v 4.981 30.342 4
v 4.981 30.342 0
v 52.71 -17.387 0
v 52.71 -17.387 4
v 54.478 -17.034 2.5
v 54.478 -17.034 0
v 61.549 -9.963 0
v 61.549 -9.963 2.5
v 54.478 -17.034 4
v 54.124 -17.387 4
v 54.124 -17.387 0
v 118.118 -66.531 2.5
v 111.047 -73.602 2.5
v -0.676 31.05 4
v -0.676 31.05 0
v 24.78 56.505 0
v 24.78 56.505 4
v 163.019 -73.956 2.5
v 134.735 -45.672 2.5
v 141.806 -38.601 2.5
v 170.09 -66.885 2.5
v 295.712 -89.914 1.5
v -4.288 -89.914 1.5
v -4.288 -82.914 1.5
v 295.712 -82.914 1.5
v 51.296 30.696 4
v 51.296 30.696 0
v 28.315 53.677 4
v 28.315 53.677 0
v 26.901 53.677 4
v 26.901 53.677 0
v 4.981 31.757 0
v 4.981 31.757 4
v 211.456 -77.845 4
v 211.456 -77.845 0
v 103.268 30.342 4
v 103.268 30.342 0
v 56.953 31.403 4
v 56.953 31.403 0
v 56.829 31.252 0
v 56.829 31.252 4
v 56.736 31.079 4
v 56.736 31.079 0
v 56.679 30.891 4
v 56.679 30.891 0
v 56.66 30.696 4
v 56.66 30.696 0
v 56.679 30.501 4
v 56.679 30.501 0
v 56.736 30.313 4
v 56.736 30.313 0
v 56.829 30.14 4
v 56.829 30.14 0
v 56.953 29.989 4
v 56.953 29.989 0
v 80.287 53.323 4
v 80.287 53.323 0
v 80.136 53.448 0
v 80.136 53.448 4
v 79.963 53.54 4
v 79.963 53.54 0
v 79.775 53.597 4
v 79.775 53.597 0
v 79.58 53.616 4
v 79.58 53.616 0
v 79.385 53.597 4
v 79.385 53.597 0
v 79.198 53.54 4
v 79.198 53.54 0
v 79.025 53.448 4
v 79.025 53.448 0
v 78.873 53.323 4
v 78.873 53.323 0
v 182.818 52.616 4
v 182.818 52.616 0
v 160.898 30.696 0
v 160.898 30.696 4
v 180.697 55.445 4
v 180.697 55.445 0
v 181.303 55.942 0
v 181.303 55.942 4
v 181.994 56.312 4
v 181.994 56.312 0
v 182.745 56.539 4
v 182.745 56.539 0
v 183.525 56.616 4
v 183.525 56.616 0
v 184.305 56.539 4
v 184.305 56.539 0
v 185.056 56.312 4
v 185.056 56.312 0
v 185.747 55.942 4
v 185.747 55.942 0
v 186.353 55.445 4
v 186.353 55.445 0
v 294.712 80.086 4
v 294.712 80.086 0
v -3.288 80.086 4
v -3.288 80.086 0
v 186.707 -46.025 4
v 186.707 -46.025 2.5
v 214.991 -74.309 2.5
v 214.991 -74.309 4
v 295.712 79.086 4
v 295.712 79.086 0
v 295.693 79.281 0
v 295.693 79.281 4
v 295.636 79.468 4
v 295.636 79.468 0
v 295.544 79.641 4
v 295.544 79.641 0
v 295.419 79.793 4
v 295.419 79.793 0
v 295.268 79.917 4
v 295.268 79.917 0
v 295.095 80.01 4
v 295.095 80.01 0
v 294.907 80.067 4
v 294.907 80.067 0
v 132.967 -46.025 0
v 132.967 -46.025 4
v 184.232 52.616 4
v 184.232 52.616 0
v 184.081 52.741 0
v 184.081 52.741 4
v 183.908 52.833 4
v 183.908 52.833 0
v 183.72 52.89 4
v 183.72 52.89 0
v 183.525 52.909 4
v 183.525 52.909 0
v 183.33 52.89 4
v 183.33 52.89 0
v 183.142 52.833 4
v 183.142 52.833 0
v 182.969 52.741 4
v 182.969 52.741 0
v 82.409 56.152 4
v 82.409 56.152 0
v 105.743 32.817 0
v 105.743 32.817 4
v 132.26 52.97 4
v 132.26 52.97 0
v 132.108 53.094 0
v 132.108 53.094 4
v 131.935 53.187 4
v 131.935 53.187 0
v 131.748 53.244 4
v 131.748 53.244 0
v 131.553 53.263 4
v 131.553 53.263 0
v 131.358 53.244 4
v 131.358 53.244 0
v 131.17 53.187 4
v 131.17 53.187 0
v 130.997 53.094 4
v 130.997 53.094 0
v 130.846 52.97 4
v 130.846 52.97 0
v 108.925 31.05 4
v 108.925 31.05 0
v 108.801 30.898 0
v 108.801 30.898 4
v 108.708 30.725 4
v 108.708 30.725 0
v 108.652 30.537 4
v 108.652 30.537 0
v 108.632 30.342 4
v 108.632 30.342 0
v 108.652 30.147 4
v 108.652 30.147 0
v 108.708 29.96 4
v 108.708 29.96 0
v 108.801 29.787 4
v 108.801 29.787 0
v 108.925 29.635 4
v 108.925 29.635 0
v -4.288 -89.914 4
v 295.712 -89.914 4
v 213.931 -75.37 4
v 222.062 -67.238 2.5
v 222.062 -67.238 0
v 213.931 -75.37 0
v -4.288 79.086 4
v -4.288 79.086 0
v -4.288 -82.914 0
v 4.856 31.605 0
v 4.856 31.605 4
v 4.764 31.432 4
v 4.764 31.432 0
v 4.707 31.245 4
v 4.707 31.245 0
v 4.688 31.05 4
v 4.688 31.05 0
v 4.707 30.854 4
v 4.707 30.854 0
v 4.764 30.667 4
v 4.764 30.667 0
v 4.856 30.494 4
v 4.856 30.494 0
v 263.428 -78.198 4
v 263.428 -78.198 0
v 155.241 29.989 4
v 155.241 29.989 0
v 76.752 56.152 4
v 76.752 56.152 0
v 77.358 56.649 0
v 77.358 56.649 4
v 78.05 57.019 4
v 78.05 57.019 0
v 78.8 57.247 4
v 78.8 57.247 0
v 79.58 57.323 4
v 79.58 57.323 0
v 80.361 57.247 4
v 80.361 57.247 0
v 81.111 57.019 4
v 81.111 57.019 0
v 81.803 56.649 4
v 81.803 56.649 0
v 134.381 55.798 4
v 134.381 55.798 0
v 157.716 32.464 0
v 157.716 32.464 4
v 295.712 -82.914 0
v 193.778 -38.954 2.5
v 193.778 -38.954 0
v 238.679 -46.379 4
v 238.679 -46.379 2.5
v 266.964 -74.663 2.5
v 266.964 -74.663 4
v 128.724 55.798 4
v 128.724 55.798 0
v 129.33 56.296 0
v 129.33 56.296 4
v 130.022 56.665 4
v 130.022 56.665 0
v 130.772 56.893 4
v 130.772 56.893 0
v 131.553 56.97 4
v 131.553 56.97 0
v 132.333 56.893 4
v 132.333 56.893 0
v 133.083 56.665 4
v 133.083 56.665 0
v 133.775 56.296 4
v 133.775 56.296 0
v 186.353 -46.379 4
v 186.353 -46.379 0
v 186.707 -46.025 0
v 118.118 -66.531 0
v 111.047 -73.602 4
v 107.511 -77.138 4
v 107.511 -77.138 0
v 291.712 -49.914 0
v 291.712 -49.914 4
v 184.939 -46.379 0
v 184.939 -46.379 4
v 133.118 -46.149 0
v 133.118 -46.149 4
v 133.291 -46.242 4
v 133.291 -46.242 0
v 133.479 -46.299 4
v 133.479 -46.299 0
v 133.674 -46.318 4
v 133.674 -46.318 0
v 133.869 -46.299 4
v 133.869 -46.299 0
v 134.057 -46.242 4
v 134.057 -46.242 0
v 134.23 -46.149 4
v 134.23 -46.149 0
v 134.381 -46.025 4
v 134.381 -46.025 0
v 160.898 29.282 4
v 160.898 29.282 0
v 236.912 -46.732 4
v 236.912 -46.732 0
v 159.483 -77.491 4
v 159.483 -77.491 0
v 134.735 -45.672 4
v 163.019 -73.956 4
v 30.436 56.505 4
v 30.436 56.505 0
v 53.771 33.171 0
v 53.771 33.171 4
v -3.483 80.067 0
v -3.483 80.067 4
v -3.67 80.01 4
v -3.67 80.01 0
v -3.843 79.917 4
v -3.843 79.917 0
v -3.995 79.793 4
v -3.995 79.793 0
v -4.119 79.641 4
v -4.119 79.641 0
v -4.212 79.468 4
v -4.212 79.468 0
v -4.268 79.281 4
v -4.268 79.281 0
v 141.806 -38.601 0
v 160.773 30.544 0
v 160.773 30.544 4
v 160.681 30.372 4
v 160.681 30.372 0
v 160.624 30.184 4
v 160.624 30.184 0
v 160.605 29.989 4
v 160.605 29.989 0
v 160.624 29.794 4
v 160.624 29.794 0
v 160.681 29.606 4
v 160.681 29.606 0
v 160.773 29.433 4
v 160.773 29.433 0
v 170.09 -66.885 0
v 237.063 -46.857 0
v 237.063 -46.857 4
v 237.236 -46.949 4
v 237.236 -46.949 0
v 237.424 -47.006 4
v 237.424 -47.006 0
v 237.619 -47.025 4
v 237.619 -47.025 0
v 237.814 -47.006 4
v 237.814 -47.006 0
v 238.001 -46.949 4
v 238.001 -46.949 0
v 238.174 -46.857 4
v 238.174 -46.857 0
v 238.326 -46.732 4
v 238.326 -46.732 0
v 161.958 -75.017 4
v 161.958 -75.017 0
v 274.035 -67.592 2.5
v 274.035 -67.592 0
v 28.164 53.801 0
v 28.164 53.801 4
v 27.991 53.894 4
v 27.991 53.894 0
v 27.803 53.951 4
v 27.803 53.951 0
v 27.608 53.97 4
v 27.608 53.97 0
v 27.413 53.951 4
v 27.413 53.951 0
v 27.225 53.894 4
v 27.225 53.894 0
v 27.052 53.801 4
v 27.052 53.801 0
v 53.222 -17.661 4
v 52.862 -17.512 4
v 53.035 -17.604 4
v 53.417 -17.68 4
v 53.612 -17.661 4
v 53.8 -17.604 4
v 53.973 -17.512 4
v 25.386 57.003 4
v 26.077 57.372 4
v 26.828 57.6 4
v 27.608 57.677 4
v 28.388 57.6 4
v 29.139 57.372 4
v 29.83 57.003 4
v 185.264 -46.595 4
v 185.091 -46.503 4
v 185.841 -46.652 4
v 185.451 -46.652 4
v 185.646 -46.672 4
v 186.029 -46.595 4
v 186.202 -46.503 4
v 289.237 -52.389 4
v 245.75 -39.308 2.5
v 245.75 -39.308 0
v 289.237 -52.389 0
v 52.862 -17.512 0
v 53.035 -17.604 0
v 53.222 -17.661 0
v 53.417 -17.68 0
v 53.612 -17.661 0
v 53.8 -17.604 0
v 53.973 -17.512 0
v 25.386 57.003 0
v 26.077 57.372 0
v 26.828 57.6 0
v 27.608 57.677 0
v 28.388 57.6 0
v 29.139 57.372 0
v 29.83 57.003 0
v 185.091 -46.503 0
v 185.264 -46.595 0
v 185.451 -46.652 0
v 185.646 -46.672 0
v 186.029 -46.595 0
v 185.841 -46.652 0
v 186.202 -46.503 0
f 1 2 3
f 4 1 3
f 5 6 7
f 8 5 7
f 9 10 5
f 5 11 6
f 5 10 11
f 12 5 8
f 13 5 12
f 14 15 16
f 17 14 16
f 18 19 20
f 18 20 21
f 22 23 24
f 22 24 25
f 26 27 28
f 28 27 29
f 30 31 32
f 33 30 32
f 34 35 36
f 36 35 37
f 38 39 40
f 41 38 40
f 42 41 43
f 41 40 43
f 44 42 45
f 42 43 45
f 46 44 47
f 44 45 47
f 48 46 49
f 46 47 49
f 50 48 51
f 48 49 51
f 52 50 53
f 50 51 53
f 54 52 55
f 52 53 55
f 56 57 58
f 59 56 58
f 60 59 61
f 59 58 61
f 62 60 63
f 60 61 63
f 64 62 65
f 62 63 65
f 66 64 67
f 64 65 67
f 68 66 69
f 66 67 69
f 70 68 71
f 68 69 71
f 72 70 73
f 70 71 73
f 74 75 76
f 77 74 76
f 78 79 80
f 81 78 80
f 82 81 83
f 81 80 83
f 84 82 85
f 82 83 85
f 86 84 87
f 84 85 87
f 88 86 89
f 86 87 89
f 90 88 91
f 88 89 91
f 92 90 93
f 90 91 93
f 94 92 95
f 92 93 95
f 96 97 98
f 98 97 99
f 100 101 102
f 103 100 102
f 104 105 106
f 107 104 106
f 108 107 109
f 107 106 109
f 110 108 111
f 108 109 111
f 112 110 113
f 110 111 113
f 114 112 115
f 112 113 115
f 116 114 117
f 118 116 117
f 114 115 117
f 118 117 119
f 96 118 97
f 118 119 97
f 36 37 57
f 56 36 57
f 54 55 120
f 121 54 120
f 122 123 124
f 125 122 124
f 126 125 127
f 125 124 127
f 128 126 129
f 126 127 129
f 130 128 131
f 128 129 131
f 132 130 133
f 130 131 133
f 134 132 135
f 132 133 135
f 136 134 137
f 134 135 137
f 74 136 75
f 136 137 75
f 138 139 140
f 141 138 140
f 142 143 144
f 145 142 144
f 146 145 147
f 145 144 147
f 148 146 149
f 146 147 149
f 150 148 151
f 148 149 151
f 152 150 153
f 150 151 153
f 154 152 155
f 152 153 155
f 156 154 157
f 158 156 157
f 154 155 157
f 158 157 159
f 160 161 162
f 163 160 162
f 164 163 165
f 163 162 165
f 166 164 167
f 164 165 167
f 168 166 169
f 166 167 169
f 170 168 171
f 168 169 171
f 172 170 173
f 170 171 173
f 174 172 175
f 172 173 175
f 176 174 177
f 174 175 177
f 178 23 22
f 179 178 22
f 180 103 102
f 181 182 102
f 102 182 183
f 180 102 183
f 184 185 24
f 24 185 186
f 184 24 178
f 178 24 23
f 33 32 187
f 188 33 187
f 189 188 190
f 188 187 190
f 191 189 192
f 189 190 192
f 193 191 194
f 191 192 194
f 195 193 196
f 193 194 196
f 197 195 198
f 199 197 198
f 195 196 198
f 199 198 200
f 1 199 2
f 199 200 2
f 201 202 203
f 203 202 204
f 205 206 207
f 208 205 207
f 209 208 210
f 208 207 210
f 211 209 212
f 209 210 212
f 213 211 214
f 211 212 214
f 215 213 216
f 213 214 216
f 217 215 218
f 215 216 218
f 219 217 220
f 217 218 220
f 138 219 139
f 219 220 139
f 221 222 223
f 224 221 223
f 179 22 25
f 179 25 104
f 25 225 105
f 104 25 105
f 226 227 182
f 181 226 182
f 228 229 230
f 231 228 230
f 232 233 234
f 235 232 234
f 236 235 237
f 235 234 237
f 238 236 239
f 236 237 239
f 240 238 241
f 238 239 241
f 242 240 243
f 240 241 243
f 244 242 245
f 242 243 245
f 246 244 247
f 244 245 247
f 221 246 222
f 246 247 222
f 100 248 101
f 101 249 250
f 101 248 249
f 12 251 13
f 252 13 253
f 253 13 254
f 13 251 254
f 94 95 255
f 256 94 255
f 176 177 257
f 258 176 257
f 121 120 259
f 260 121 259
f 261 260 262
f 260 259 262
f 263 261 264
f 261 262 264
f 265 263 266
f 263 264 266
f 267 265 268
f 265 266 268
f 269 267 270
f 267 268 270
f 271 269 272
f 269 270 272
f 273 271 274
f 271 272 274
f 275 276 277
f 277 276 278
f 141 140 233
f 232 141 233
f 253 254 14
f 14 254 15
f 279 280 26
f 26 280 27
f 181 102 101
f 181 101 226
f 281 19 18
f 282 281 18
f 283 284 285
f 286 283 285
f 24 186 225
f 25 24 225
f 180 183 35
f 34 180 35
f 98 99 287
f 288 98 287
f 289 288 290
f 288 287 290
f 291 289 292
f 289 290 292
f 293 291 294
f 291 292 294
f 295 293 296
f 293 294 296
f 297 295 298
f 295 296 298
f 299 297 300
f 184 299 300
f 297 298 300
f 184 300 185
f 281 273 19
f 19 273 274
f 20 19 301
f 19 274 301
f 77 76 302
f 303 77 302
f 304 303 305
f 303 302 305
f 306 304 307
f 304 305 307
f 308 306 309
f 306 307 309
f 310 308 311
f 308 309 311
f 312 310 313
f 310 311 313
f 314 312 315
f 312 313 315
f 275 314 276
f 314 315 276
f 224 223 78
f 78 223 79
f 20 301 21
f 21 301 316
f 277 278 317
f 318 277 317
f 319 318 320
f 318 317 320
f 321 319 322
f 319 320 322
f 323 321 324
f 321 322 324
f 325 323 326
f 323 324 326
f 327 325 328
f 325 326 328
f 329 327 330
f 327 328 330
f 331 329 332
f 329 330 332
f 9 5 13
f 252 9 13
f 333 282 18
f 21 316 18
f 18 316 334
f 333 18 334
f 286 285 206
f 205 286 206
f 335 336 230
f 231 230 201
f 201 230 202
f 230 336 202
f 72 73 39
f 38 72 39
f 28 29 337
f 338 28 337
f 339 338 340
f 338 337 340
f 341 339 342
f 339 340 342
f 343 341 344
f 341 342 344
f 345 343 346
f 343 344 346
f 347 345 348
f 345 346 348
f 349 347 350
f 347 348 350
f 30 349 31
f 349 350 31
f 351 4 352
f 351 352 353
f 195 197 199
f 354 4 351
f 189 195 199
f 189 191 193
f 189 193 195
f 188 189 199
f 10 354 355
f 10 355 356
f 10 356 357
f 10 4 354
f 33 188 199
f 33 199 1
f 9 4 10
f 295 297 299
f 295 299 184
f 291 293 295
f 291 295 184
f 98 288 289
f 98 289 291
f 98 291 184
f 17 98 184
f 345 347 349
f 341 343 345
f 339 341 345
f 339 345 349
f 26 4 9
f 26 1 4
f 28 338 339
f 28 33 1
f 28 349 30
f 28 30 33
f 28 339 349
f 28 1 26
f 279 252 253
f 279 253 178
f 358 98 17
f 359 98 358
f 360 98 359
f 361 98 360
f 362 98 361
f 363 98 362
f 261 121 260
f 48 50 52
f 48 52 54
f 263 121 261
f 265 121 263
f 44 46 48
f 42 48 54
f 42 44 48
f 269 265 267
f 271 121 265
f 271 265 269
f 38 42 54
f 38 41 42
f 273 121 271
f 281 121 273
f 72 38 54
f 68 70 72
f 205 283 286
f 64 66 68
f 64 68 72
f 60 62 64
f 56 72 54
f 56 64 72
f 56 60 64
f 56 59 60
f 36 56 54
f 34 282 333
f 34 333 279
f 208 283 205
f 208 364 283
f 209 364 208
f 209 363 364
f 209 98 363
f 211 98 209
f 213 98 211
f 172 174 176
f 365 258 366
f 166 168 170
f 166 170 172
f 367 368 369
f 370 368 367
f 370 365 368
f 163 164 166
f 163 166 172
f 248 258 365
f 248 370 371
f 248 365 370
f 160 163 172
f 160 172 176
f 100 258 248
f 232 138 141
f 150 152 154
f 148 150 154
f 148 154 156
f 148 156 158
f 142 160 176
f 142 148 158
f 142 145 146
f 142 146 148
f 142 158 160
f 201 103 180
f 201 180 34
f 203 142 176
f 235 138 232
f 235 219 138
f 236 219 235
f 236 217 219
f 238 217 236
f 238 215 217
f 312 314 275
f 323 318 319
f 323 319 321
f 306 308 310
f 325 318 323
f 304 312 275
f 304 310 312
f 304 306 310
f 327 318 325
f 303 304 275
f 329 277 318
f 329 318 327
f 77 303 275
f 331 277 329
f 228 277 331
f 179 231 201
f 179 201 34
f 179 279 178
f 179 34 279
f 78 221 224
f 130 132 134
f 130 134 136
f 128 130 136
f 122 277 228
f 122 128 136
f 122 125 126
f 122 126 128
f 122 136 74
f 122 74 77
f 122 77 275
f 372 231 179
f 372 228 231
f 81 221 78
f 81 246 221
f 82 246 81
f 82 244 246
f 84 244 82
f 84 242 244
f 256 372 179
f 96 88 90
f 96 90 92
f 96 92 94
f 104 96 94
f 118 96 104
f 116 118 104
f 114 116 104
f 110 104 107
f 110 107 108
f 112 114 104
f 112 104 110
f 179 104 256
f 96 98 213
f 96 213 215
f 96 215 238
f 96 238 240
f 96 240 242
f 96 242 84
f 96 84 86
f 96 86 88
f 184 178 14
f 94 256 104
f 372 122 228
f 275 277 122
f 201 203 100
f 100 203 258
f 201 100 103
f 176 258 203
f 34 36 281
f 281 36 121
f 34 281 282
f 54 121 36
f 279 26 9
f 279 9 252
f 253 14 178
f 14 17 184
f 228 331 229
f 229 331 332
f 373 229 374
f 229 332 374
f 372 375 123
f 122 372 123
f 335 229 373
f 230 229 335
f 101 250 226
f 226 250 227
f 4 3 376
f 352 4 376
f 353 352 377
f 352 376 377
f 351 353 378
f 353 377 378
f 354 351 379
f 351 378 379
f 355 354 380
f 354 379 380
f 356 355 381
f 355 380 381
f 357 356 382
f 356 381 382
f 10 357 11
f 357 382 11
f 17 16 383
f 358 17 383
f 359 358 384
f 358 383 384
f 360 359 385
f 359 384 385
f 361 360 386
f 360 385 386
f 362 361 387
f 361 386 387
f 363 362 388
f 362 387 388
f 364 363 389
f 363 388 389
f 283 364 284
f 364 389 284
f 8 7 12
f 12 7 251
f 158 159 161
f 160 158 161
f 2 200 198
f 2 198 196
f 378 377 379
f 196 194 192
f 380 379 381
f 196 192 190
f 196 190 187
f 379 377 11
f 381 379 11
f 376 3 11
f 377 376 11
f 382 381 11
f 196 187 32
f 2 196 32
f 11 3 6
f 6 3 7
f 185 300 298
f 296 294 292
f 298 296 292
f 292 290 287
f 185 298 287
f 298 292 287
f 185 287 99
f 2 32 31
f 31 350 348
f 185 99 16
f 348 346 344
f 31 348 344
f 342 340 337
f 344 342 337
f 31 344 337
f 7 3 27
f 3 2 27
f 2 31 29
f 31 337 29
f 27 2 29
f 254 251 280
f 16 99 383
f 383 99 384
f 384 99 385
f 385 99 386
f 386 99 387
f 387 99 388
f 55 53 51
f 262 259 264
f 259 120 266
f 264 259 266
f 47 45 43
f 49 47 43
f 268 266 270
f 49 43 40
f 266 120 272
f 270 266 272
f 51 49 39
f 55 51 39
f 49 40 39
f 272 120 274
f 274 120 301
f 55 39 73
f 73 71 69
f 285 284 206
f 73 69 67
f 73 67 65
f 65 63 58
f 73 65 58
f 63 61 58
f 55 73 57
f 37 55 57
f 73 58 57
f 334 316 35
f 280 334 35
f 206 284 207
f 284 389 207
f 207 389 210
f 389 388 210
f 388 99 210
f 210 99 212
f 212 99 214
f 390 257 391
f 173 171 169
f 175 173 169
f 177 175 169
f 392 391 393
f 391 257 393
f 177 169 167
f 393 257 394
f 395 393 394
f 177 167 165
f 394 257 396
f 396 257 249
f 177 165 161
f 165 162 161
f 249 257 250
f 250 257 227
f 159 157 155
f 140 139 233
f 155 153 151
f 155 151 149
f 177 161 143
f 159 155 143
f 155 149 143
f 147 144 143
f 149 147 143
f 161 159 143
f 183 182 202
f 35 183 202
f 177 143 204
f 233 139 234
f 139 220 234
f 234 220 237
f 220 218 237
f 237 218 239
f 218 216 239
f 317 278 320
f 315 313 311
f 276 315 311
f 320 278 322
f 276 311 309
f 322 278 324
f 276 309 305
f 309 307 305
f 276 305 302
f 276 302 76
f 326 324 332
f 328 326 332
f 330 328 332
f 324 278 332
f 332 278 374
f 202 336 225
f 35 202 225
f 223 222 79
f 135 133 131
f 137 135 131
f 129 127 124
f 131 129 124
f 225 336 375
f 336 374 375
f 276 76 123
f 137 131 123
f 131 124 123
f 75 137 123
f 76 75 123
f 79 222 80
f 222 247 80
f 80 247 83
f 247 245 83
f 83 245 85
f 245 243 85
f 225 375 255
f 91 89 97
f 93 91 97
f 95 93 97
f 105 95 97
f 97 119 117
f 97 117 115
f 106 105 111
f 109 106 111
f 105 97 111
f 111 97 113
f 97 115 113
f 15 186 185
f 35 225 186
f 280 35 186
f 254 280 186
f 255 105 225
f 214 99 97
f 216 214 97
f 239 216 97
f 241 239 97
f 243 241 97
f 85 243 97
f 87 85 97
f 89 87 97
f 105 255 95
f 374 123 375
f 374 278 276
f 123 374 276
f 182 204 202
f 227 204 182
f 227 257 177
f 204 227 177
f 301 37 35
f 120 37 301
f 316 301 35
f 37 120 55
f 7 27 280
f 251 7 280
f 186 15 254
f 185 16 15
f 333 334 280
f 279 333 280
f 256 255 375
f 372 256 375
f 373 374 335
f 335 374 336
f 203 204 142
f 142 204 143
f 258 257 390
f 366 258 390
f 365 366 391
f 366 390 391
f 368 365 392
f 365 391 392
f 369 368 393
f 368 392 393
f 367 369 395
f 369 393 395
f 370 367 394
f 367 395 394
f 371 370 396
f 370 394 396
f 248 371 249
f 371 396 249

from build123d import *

# Parameters (mm, degrees)
F1_DEPTH = 4
F2_W     = 300
F2_H     = 7
F3_DEPTH = 1.5
F4_DEPTH = 2.5


with BuildPart() as f1:
    # F0 (on Top) → F1 (new body)
    with BuildSketch(Plane.XY):
        with BuildLine():
            Line((-4.287656, -89.914214), (295.712344, -89.914214))
            Line((295.712344, -89.914214), (295.712344, 79.085786))
            ThreePointArc((295.712344, 79.085786), (295.41945, 79.792893), (294.712344, 80.085786))
            Line((294.712344, 80.085786), (-3.287656, 80.085786))
            ThreePointArc((-3.287656, 80.085786), (-3.994763, 79.792893), (-4.287656, 79.085786))
            Line((-4.287656, 79.085786), (-4.287656, -89.914214))
        make_face()
        with BuildLine():
            ThreePointArc((180.696579, 55.444697), (183.525006, 56.61627), (186.353433, 55.444697))
            Line((186.353433, 55.444697), (291.712344, -49.914214))
            Line((291.712344, -49.914214), (289.23747, -52.389087))
            Line((289.23747, -52.389087), (184.232113, 52.61627))
            ThreePointArc((184.232113, 52.61627), (183.525006, 52.909163), (182.817899, 52.61627))
            Line((182.817899, 52.61627), (160.897589, 30.695959))
            ThreePointArc((160.897589, 30.695959), (160.604696, 29.988853), (160.897589, 29.281746))
            Line((160.897589, 29.281746), (236.911568, -46.732233))
            ThreePointArc((236.911568, -46.732233), (237.618675, -47.025126), (238.325782, -46.732233))
            Line((238.325782, -46.732233), (238.679335, -46.37868))
            Line((238.679335, -46.37868), (266.963606, -74.662951))
            Line((266.963606, -74.662951), (265.902946, -75.723611))
            Line((265.902946, -75.723611), (263.428072, -78.198485))
            Line((263.428072, -78.198485), (155.240735, 29.988853))
            Line((155.240735, 29.988853), (132.259764, 52.969823))
            ThreePointArc((132.259764, 52.969823), (131.552658, 53.262716), (130.845551, 52.969823))
            Line((130.845551, 52.969823), (108.925241, 31.049513))
            ThreePointArc((108.925241, 31.049513), (108.632347, 30.342406), (108.925241, 29.635299))
            Line((108.925241, 29.635299), (184.93922, -46.37868))
            ThreePointArc((184.93922, -46.37868), (185.646326, -46.671573), (186.353433, -46.37868))
            Line((186.353433, -46.37868), (186.706987, -46.025126))
            Line((186.706987, -46.025126), (214.991258, -74.309398))
            Line((214.991258, -74.309398), (213.930598, -75.370058))
            Line((213.930598, -75.370058), (211.455724, -77.844931))
            Line((211.455724, -77.844931), (103.268386, 30.342406))
            Line((103.268386, 30.342406), (80.287416, 53.323376))
            ThreePointArc((80.287416, 53.323376), (79.580309, 53.61627), (78.873202, 53.323376))
            Line((78.873202, 53.323376), (56.952892, 31.403066))
            ThreePointArc((56.952892, 31.403066), (56.659999, 30.695959), (56.952892, 29.988853))
            Line((56.952892, 29.988853), (132.966871, -46.025126))
            ThreePointArc((132.966871, -46.025126), (133.673978, -46.318019), (134.381085, -46.025126))
            Line((134.381085, -46.025126), (134.734638, -45.671573))
            Line((134.734638, -45.671573), (163.018909, -73.955844))
            Line((163.018909, -73.955844), (161.958249, -75.016504))
            Line((161.958249, -75.016504), (159.483376, -77.491378))
            Line((159.483376, -77.491378), (51.296038, 30.695959))
            Line((51.296038, 30.695959), (28.315068, 53.67693))
            ThreePointArc((28.315068, 53.67693), (27.607961, 53.969823), (26.900854, 53.67693))
            Line((26.900854, 53.67693), (4.980544, 31.75662))
            ThreePointArc((4.980544, 31.75662), (4.687651, 31.049513), (4.980544, 30.342406))
            Line((4.980544, 30.342406), (52.710252, -17.387302))
            ThreePointArc((52.710252, -17.387302), (53.417358, -17.680195), (54.124465, -17.387302))
            Line((54.124465, -17.387302), (54.478019, -17.033748))
            Line((54.478019, -17.033748), (111.046561, -73.602291))
            Line((111.046561, -73.602291), (109.985901, -74.662951))
            Line((109.985901, -74.662951), (107.511027, -77.137825))
            Line((107.511027, -77.137825), (-0.67631, 31.049513))
            Line((-0.67631, 31.049513), (24.779534, 56.505357))
            ThreePointArc((24.779534, 56.505357), (27.607961, 57.67693), (30.436388, 56.505357))
            Line((30.436388, 56.505357), (53.770912, 33.170833))
            Line((53.770912, 33.170833), (76.751882, 56.151804))
            ThreePointArc((76.751882, 56.151804), (79.580309, 57.323376), (82.408736, 56.151804))
            Line((82.408736, 56.151804), (105.74326, 32.81728))
            Line((105.74326, 32.81728), (128.724231, 55.79825))
            ThreePointArc((128.724231, 55.79825), (131.552658, 56.969823), (134.381085, 55.79825))
            Line((134.381085, 55.79825), (157.715609, 32.463726))
            Line((157.715609, 32.463726), (180.696579, 55.444697))
        make_face(mode=Mode.SUBTRACT)
    extrude(amount=F1_DEPTH)

    # F2 (on face) → F3 (cut)
    with BuildSketch(Plane(origin=(0, 0, 0), x_dir=(1, 0, 0), z_dir=(0, 0, -1))):
        with Locations((145.712344, 86.414214)):
            Rectangle(F2_W, F2_H)
    extrude(amount=-F3_DEPTH, mode=Mode.SUBTRACT)

    # F2 (on face) → F4 (cut)
    with BuildSketch(Plane(origin=(0, 0, 0), x_dir=(1, 0, 0), z_dir=(0, 0, -1))):
        Polygon((118.117629, 66.531223), (111.046561, 73.602291), (54.478019, 17.033748), (61.549086, 9.96268), align=None)
        Polygon((170.089977, 66.884776), (163.018909, 73.955844), (134.734638, 45.671573), (141.805706, 38.600505), align=None)
        Polygon((222.062326, 67.23833), (214.991258, 74.309398), (186.706987, 46.025126), (193.778054, 38.954058), align=None)
        Polygon((274.034674, 67.591883), (266.963606, 74.662951), (238.679335, 46.37868), (245.750403, 39.307612), align=None)
    extrude(amount=-F4_DEPTH, mode=Mode.SUBTRACT)


solid = f1.part
